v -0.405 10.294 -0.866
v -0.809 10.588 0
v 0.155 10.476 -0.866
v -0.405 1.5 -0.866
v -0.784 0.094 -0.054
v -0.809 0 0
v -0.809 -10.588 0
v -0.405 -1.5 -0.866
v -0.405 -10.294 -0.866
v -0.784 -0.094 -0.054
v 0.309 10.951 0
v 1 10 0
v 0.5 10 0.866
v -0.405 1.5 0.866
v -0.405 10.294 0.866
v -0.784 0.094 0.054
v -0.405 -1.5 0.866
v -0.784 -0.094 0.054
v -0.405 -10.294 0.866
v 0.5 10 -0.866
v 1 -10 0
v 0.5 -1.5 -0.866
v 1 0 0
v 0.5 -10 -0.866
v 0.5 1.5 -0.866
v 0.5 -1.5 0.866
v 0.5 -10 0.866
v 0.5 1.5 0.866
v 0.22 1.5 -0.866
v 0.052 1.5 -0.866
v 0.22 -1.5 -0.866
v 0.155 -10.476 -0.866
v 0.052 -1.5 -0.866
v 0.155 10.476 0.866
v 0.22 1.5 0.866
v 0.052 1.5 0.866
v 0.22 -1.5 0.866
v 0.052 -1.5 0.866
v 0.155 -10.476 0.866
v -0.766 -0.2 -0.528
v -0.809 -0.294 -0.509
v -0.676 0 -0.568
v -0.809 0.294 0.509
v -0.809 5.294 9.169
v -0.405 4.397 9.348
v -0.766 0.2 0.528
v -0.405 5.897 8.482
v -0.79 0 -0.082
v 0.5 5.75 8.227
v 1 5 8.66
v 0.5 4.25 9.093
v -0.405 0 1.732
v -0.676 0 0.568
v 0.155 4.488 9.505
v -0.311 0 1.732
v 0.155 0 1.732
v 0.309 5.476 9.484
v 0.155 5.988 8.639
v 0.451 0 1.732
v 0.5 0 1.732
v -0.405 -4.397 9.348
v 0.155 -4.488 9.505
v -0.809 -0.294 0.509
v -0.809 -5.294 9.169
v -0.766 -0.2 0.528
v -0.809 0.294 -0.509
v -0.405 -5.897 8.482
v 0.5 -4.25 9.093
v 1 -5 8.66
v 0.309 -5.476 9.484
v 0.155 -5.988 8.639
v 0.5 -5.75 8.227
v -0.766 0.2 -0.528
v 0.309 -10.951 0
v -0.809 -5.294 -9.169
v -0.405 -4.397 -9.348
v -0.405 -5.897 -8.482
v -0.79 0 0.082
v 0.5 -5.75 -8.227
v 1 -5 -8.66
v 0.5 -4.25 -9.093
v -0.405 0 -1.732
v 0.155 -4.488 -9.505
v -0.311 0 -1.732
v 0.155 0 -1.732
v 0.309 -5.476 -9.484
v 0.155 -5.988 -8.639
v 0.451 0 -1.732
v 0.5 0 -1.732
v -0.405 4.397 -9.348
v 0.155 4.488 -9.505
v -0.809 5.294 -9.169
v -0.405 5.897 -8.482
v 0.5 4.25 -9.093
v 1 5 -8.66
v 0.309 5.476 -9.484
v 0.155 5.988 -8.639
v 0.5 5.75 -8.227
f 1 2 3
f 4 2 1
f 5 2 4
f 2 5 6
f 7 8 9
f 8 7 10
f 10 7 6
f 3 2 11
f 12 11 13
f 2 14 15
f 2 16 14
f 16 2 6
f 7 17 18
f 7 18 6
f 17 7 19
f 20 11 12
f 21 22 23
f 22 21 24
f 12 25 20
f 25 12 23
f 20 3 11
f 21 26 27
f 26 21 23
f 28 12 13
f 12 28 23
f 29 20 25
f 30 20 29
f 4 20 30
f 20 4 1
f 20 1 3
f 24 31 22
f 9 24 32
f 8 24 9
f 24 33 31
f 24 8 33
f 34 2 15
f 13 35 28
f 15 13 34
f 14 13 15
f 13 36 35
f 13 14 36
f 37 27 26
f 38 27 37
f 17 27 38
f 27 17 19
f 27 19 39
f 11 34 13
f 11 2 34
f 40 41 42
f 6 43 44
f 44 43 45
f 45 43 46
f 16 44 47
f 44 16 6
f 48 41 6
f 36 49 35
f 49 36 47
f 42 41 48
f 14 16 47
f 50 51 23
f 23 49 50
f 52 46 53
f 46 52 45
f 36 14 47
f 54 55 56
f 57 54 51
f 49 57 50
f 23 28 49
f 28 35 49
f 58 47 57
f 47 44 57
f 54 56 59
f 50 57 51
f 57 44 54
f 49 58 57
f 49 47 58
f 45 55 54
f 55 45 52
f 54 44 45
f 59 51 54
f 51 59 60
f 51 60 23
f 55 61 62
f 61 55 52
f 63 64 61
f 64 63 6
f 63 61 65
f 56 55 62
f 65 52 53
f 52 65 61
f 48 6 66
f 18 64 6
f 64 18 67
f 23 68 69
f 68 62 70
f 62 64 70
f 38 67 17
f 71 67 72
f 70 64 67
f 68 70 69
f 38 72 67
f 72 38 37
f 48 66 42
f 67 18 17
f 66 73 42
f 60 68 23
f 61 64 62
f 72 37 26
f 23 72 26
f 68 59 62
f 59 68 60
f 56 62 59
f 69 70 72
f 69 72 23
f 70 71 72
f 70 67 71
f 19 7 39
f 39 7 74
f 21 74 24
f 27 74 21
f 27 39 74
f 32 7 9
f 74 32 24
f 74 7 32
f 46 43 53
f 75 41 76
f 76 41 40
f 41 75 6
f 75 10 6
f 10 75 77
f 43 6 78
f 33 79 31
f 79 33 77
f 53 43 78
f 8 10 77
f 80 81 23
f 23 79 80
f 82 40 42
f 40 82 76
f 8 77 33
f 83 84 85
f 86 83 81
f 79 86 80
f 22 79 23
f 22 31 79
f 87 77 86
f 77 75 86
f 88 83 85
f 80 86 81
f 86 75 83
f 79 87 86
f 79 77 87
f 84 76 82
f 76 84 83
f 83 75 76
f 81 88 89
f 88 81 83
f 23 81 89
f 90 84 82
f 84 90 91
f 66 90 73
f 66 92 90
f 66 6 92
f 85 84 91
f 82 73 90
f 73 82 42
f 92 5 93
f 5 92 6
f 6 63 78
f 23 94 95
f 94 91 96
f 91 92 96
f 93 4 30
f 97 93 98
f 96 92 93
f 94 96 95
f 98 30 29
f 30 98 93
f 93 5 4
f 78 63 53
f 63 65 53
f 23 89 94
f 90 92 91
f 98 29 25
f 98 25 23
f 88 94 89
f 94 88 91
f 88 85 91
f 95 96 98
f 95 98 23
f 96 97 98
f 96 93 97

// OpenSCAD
module estrella()
{
for ( i = [0 : 5] )
{
    rotate( i * 360 / 6, [1, 0, 0])
    
    hull()
    {
    sphere(r=1);
    translate([0, 10, 0])
    sphere(r = 1);
    }
}
}
estrella();
